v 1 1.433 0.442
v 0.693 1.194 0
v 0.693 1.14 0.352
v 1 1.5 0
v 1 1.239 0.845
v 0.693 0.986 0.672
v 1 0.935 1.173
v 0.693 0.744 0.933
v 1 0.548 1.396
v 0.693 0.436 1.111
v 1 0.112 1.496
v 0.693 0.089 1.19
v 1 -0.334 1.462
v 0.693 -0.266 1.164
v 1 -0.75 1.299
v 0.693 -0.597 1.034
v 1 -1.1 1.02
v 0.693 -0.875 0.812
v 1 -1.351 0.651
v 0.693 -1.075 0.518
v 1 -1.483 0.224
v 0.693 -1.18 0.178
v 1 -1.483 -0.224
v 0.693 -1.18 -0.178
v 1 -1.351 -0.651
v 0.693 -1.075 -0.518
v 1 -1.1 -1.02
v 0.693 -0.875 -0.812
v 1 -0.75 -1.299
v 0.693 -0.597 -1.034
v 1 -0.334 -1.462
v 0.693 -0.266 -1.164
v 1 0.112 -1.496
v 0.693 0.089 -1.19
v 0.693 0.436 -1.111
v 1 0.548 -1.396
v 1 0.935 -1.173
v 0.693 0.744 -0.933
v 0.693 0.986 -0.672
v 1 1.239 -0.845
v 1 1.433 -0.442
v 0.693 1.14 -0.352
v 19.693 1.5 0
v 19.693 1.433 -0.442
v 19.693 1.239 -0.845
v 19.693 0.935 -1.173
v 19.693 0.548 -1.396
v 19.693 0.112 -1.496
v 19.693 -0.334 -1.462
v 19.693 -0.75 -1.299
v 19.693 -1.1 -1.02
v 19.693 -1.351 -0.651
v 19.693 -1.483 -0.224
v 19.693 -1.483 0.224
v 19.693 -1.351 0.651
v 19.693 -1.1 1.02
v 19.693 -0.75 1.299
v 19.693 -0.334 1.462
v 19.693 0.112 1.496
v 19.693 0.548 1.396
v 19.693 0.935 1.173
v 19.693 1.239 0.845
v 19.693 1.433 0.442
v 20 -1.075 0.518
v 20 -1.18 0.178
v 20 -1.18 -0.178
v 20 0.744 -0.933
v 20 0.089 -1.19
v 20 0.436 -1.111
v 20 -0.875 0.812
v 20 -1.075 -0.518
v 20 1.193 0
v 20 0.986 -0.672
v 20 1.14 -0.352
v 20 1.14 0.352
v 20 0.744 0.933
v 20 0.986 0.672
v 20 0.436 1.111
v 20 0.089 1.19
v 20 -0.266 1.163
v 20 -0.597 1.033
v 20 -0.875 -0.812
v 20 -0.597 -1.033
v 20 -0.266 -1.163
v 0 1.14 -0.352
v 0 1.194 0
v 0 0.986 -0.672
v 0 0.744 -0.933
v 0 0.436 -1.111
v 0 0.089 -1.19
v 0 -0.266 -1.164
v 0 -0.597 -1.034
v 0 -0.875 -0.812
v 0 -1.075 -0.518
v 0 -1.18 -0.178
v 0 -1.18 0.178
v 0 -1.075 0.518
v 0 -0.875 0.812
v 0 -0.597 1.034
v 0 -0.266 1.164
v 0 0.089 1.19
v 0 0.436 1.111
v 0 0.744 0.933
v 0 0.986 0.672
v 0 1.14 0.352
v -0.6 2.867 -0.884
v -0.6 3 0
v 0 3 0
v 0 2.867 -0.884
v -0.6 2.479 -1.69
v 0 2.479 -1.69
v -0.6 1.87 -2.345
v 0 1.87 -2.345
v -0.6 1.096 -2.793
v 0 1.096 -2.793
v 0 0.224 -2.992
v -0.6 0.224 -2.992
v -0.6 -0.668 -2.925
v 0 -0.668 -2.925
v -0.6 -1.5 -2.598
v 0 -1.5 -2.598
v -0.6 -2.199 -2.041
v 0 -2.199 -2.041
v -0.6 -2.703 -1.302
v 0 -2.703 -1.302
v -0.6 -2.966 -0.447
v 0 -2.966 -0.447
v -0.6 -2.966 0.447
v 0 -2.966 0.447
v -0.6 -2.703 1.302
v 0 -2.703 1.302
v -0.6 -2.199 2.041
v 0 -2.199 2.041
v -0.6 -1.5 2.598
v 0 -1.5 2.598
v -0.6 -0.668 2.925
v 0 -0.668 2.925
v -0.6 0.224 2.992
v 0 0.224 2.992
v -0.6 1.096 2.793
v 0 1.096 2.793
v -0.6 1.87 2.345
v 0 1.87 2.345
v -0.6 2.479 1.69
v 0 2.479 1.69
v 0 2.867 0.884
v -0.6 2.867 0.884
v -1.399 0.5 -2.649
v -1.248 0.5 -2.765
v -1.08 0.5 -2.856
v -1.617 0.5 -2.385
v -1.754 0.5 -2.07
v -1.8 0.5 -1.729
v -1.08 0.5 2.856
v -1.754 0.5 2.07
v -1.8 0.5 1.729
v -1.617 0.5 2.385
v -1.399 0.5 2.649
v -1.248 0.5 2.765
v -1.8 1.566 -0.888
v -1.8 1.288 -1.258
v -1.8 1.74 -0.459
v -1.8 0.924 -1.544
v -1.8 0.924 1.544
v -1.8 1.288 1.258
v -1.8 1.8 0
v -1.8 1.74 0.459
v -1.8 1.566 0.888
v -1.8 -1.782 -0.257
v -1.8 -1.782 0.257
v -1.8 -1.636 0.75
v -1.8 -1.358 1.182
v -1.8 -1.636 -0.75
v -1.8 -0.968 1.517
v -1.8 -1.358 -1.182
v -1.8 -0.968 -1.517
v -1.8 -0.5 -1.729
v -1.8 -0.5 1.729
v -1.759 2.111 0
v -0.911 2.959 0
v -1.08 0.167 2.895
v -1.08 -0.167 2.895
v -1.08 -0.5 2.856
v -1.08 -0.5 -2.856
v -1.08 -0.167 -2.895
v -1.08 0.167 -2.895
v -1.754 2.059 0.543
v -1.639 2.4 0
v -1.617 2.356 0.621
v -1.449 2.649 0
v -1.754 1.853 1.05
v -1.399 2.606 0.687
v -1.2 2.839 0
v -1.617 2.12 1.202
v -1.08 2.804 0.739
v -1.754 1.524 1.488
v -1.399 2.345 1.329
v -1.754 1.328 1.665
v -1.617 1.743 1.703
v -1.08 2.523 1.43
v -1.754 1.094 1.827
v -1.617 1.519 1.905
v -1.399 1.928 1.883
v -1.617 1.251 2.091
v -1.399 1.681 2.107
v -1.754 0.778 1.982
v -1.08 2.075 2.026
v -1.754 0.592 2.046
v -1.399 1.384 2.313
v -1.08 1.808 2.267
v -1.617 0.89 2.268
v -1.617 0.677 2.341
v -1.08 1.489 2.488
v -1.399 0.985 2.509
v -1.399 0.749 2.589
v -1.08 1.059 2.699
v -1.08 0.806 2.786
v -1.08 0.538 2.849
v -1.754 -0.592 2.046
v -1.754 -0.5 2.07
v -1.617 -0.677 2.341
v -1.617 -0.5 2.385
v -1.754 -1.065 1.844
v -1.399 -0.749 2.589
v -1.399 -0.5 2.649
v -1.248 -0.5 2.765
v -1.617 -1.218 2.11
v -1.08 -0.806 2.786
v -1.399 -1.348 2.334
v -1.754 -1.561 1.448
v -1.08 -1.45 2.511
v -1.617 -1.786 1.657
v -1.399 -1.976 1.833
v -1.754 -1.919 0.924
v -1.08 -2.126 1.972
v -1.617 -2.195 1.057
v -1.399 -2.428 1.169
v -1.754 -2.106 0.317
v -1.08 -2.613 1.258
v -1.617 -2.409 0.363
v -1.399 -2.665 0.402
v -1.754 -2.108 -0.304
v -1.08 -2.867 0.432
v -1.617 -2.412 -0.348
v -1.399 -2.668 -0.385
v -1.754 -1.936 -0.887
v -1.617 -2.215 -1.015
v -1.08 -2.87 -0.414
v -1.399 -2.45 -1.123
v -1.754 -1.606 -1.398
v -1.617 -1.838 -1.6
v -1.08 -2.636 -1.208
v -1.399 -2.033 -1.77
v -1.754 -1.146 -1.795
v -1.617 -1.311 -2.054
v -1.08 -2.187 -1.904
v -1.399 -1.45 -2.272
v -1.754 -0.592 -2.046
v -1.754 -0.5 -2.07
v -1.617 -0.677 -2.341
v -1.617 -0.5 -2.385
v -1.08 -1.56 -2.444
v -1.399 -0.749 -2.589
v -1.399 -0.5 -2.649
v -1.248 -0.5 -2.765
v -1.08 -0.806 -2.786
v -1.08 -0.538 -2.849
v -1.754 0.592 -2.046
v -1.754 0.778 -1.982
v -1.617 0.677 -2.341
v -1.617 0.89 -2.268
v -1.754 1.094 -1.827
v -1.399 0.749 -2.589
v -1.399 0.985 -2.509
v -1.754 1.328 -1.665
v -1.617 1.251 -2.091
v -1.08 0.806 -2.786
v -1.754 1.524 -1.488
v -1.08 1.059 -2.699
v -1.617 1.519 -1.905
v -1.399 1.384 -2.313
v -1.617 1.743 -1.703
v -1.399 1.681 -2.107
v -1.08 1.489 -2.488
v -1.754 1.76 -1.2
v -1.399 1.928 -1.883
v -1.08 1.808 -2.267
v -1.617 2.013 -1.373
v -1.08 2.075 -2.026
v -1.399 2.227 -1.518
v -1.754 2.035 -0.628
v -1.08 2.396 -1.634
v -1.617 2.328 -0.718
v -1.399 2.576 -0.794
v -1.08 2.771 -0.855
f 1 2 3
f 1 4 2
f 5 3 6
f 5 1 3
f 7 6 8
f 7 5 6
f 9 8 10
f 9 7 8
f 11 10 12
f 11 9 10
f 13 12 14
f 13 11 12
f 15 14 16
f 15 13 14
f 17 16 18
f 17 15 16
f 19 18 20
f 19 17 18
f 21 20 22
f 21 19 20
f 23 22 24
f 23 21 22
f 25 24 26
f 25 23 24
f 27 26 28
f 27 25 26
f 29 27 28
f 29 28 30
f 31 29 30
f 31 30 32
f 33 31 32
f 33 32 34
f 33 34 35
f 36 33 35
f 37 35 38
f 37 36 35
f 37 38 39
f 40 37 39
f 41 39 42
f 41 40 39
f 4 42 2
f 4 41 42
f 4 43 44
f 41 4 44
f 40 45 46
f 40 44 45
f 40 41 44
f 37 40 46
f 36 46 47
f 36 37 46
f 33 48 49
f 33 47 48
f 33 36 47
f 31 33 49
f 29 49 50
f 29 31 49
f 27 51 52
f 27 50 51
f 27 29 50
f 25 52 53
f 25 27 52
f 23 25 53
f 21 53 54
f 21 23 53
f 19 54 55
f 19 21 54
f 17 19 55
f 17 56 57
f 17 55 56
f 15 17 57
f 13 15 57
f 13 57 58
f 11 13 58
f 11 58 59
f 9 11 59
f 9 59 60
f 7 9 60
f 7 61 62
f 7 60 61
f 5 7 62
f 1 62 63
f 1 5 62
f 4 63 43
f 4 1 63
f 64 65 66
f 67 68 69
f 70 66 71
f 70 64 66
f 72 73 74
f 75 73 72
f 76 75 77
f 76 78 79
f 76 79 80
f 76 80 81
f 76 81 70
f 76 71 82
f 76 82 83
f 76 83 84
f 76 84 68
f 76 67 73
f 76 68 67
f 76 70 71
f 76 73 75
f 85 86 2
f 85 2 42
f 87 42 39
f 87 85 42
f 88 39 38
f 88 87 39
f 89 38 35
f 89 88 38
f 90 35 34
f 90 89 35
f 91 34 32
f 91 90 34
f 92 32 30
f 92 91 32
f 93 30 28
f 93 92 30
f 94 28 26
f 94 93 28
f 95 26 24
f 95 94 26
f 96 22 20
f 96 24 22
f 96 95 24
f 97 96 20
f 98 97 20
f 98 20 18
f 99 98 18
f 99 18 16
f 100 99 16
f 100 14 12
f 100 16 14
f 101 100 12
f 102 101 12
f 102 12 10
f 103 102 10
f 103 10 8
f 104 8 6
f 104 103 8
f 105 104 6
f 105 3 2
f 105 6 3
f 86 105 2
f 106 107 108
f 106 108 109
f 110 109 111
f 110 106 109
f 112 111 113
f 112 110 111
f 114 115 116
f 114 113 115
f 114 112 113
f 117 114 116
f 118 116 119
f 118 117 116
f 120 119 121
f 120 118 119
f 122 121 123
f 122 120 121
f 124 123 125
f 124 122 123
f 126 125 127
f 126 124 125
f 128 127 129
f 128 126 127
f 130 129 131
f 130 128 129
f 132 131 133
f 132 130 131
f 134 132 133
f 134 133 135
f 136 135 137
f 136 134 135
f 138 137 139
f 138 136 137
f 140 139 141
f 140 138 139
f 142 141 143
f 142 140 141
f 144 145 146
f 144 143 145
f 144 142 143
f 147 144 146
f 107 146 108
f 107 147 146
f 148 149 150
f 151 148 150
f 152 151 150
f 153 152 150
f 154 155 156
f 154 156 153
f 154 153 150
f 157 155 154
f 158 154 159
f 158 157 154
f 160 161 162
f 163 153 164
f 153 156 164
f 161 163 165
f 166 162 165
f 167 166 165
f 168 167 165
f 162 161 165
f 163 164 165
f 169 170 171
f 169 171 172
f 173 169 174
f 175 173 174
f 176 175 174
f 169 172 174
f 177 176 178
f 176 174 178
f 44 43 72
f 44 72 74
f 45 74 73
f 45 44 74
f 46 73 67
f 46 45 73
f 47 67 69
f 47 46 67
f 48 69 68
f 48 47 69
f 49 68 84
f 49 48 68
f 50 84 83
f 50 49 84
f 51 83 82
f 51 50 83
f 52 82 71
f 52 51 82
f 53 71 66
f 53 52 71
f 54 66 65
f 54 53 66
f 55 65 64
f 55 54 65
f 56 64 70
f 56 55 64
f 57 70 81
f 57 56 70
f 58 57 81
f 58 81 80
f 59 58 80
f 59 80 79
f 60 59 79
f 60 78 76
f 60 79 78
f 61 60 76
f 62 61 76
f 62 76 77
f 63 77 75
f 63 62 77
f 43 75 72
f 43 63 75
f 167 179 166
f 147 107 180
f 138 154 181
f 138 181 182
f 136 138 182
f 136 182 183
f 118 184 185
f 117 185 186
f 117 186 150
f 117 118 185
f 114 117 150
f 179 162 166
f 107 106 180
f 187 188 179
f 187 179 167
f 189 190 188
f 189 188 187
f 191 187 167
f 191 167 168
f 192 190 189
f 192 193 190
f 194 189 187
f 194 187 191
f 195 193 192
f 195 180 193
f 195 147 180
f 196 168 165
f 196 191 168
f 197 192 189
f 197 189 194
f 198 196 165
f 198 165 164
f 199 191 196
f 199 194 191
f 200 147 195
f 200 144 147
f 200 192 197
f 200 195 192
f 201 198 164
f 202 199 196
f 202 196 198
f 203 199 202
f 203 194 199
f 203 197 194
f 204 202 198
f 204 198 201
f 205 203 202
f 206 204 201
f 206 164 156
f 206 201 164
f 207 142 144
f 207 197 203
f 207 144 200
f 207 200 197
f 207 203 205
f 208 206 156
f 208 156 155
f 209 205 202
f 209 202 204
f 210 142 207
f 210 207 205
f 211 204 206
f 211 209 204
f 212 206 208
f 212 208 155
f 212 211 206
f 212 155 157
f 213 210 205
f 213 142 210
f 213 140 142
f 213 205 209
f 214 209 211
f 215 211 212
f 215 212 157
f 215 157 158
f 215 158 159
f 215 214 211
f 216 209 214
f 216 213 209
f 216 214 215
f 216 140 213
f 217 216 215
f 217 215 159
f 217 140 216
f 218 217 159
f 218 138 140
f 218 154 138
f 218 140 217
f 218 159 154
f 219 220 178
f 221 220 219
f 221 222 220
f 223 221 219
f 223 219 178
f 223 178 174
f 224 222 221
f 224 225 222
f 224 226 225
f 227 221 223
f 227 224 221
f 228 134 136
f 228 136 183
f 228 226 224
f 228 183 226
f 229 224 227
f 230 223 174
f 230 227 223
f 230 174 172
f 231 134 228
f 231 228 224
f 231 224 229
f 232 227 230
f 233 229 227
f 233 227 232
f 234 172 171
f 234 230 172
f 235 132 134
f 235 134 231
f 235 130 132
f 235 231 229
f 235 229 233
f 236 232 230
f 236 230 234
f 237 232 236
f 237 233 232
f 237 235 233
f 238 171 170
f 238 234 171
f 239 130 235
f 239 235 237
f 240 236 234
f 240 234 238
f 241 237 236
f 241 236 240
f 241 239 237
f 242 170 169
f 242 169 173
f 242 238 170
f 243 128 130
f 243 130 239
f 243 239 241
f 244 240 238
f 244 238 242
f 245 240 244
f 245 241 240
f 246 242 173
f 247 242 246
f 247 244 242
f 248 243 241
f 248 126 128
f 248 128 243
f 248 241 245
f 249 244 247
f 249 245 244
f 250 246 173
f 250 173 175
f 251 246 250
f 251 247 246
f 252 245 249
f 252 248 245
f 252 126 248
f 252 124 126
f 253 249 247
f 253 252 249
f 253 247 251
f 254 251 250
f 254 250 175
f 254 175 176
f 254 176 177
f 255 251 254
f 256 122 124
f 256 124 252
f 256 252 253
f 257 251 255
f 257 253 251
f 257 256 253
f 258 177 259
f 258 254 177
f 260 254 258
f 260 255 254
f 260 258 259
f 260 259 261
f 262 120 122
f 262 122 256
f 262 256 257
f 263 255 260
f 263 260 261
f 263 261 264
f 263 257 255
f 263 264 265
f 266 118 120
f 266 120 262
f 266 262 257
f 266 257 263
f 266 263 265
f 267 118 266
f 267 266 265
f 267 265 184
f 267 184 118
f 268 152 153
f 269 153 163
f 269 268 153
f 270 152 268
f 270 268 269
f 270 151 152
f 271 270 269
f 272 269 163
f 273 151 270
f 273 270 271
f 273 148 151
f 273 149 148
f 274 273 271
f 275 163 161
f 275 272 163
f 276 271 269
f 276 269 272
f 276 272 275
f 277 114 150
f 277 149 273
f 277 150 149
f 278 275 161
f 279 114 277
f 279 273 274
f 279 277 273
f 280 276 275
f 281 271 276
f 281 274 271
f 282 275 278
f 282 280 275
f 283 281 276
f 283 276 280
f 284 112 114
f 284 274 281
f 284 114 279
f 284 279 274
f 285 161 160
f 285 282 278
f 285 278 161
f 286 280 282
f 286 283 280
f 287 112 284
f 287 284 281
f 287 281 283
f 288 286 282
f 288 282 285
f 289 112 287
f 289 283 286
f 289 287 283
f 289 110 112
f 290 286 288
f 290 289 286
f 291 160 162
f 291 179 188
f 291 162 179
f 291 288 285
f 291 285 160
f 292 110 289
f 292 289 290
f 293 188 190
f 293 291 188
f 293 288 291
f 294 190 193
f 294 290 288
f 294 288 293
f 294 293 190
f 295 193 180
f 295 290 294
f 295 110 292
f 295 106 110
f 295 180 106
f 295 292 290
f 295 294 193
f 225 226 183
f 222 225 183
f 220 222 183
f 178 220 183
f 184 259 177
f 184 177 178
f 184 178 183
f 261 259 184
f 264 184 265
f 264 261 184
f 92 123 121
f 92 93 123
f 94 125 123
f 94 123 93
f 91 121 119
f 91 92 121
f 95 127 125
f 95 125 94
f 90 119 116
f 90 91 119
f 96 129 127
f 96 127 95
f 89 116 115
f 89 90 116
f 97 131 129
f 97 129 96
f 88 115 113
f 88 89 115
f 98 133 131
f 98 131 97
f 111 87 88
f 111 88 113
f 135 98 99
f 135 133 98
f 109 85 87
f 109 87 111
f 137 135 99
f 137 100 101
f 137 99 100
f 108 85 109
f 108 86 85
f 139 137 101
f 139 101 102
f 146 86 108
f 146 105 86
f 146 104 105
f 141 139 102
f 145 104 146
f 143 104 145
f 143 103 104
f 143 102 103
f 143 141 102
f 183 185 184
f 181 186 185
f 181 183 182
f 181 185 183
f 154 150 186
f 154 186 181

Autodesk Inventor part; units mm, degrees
ref_plane "YZ Plane" through (0, 0, 0) normal (1, 0, 0) x (0, 1, 0)
ref_plane "XZ Plane" through (0, 0, 0) normal (0, 1, 0) x (-1, 0, 0)
sketch "Sketch1" plane through (0, 0, 0) normal (0, 0, 1) x (1, 0, 0)
  line L0 (-1.8, 0) -> (20, 0)
  line L1 (20, 0) -> (20, 1.5)
  line L2 (20, 1.5) -> (1, 1.5)
  line L3 (1, 1.5) -> (0.6932, 1.1935)
  line L4 (0.6932, 1.1935) -> (0, 1.1935)
  line L5 (0, 1.1935) -> (0, 3)
  line L6 (-6.16, 0) -> (24.36, 0) projected
  line L7 (0, -0.6) -> (0, 3.6) projected
  line L8 (-1.8, 0) -> (-1.8, 2.9997)
  line L9 (0, 3) -> (-1.8, 2.9997)
  line L10 (1, 1.5) -> (0, 1.5) construction
  dimension "d0" = 20
  dimension "d1" = 19
  dimension "d2" = 0.3068
  dimension "d3" = 1.8
  dimension "d4" = 3
  dimension "d5" = 2.387
  dimension "d9" = 6
  dimension "d10" = 0.01
revolve "Body" add sketch "Sketch1" angle 360 about axis through (-1.8, 0, 0) along (1, 0, 0)
sketch "Sketch2" plane through (-1.8, 0, 0) normal (-1, 0, 0) x (0, 0, 1)
  circle A0 centre (0, 0) radius 3 projected
  line L0 (0, 0) -> (0, 2.9997) projected
  line L1 (-3, 0.5) -> (3, 0.5)
  line L2 (3, 0.5) -> (3, -0.5)
  line L3 (3, -0.5) -> (-3, -0.5)
  line L4 (-3, -0.5) -> (-3, 0.5)
  line L5 (-3, 0) -> (3, 0) construction
  line L6 (0, 0.5) -> (0, -0.5) construction
  dimension "d11" = 1
  dimension "d12" = 6
fillet "Fillet1" radius 1.2 1 edges at (-1.8, -2.9997, 0)
extrude "Slot" cut sketch "Sketch2" against normal blind 0.72 contours A0 L3 L1 | L2 L3 A0 | A0 L1 L2 | L3 L4 A0 | A0 L4 L1
thread "Thread" size "M3x0.5" class "6g" standard "ISO Metric profile" length 19
chamfer "Chamfer1" distance 0.3067 distance2 0.3068 1 edges at (20, -1.5, 0) measured on face at (20, 0.3743, -0.3316)
ref_plane "Work Plane1" through (30.1625, 0, 0) normal (0, 0, -1) x (1, 0, 0)
equation "\"d11\" = SBR"
equation "\"d12\" = KOD"
equation "\"d14\" = RR"
equation "\"d19\" = STI"
equation "\"d15\" = GEL"
equation "\"d17\" = -0.5 * SPD + 0.5 * GD"
equation "\"d0\" = NLG"
equation "\"d1\" = GEL"
equation "\"d3\" = KOH"
equation "\"d4\" = GD"
equation "\"d5\" = BDM"
equation "\"d9\" = KOD"
equation "\"d10\" = KEWI"
equation "\"GD\" = NND"
equation "\"NLG\" = 20"
equation "\"GEL\" = 19"
equation "\"KOD\" = 6"
equation "\"KOH\" = 1.8"
equation "\"GAL\" = 0.61345 * PTC"
equation "\"SPD\" = NND - 1.2269 * PTC"
equation "\"BDM\" = 2.387"
equation "\"GUL\" = 0.61345 * PTC"
equation "\"RR\" = 1.2"
equation "\"SBR\" = 1"
equation "\"STI\" = 0.72"
equation "\"KEWI\" = 0.01deg"
equation "\"PTC\" = 0.5"
equation "\"THREADDIA\" = 3"
equation "\"TOA\" = 30deg"
equation "\"NND\" = 3"
equation "\"RR1\" = 0.3"
equation "\"GD1\" = THREADDIA - 1.2269 * PTC"
properties part number "AS 1427 - M3 x 20(6)" material "Steel, Mild"
